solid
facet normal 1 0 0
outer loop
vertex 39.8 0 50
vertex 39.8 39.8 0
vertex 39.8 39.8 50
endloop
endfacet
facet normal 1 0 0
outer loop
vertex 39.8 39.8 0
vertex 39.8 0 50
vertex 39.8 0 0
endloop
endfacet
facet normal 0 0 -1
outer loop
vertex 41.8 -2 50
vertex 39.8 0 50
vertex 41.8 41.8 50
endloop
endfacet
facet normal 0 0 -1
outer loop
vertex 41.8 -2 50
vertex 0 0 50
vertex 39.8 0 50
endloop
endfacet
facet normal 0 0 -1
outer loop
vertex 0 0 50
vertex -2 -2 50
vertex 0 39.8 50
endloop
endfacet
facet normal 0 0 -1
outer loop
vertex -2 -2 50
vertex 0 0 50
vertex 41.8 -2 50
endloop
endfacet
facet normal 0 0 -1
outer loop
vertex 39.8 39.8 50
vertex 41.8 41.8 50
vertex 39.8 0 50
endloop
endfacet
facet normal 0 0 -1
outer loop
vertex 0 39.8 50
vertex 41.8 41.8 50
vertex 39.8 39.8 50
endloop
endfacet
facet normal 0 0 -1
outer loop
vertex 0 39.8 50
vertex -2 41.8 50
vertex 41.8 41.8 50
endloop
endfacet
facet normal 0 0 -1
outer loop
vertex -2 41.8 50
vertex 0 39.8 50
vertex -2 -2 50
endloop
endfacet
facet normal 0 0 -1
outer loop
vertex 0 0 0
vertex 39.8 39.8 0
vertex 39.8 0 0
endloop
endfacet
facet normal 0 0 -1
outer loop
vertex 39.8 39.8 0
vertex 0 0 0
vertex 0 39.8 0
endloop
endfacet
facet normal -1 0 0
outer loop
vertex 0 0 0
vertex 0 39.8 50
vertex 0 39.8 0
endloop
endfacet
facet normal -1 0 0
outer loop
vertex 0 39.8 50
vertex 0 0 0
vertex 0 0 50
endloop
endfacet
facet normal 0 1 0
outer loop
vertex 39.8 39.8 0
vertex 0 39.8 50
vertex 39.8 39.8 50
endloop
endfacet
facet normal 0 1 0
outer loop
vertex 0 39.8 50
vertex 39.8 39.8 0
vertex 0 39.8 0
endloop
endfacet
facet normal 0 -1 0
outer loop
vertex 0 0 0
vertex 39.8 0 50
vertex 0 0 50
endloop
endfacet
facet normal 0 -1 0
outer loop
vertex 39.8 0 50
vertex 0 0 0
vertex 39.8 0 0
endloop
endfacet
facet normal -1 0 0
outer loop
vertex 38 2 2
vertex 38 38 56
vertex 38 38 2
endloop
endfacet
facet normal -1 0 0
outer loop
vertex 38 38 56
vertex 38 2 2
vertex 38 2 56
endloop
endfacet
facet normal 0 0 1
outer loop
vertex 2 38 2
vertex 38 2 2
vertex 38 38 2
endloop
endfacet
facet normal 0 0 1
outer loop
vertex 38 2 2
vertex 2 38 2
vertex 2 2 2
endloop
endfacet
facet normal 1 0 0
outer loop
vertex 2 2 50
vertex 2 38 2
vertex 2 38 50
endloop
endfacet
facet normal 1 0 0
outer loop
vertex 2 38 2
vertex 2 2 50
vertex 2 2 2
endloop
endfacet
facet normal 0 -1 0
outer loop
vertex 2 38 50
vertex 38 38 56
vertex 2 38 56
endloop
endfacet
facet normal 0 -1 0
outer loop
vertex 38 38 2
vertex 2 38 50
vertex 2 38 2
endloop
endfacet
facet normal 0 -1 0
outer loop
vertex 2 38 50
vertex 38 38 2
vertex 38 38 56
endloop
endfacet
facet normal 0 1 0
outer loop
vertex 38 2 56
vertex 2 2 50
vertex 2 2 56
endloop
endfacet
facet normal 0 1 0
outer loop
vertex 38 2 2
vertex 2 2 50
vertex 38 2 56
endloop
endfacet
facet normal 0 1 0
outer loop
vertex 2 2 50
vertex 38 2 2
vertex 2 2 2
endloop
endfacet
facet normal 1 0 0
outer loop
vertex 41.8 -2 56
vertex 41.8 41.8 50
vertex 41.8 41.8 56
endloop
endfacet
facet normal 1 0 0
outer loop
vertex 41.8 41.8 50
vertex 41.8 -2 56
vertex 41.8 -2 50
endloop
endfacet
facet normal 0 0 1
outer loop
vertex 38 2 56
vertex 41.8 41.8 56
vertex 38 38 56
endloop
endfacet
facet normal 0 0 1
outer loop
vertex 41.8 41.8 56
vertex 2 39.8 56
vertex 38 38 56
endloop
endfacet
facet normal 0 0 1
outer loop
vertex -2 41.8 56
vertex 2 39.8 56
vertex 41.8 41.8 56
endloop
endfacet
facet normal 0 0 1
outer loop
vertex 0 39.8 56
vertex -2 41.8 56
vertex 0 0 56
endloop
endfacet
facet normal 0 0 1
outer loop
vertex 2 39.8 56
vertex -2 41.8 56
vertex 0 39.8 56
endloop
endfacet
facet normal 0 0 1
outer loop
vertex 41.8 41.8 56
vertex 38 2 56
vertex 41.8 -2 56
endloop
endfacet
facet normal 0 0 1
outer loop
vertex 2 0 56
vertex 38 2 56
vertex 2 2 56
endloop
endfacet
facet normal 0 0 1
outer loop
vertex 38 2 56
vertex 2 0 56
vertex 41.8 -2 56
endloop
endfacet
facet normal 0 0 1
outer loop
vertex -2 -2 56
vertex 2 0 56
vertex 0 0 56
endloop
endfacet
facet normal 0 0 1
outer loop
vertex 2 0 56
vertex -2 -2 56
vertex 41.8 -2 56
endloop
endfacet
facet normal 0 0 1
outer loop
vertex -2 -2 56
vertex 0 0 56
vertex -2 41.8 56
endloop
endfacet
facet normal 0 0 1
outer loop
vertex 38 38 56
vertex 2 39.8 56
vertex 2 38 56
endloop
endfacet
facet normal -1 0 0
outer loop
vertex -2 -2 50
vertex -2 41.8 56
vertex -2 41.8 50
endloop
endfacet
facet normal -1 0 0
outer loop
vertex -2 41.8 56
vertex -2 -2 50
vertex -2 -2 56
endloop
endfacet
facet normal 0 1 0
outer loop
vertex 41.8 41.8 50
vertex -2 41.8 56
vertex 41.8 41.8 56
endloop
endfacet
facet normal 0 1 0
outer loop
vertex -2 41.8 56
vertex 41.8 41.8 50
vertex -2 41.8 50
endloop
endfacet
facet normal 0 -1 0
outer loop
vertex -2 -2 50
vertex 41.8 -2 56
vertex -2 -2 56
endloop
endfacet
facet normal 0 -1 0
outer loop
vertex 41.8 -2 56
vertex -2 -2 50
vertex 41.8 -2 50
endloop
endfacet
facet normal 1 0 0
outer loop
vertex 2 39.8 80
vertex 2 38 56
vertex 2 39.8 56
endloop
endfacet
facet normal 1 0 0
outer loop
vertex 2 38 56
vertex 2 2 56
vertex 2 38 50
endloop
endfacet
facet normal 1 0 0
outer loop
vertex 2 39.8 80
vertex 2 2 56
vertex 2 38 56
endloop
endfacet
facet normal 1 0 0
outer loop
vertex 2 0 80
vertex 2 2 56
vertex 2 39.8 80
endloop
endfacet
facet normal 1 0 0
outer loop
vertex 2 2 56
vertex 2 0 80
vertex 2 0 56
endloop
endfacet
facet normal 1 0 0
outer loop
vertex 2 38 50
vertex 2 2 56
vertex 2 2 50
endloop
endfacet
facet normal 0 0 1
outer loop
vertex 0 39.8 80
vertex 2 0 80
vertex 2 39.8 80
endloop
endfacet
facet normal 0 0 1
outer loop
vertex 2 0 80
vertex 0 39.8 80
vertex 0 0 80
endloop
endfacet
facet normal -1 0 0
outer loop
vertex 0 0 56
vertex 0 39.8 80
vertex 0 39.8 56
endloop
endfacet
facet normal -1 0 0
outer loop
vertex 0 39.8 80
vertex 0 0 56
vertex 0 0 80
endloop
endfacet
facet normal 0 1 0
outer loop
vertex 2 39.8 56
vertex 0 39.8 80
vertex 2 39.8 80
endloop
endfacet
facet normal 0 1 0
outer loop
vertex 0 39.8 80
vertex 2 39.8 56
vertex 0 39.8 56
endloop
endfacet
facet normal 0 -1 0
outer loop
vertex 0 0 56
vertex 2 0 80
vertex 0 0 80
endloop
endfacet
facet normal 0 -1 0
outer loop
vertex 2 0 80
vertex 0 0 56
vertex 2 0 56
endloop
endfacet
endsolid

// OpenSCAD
h = 50;
size = 39.8;

// bottom
difference(){
    cube([size,size,h]);
    translate([2,2,2]){
        cube([36,36,h]);
    }
}

// baffle
bh = 30;
translate([0,0,h]){
    cube([2,size,bh]);
}

difference(){
    translate([-2,-2,h]){
        cube([size+4,size+4,6]);
    }
    translate([2,2,h-1]){
        cube(36,36,5);
    }
}
